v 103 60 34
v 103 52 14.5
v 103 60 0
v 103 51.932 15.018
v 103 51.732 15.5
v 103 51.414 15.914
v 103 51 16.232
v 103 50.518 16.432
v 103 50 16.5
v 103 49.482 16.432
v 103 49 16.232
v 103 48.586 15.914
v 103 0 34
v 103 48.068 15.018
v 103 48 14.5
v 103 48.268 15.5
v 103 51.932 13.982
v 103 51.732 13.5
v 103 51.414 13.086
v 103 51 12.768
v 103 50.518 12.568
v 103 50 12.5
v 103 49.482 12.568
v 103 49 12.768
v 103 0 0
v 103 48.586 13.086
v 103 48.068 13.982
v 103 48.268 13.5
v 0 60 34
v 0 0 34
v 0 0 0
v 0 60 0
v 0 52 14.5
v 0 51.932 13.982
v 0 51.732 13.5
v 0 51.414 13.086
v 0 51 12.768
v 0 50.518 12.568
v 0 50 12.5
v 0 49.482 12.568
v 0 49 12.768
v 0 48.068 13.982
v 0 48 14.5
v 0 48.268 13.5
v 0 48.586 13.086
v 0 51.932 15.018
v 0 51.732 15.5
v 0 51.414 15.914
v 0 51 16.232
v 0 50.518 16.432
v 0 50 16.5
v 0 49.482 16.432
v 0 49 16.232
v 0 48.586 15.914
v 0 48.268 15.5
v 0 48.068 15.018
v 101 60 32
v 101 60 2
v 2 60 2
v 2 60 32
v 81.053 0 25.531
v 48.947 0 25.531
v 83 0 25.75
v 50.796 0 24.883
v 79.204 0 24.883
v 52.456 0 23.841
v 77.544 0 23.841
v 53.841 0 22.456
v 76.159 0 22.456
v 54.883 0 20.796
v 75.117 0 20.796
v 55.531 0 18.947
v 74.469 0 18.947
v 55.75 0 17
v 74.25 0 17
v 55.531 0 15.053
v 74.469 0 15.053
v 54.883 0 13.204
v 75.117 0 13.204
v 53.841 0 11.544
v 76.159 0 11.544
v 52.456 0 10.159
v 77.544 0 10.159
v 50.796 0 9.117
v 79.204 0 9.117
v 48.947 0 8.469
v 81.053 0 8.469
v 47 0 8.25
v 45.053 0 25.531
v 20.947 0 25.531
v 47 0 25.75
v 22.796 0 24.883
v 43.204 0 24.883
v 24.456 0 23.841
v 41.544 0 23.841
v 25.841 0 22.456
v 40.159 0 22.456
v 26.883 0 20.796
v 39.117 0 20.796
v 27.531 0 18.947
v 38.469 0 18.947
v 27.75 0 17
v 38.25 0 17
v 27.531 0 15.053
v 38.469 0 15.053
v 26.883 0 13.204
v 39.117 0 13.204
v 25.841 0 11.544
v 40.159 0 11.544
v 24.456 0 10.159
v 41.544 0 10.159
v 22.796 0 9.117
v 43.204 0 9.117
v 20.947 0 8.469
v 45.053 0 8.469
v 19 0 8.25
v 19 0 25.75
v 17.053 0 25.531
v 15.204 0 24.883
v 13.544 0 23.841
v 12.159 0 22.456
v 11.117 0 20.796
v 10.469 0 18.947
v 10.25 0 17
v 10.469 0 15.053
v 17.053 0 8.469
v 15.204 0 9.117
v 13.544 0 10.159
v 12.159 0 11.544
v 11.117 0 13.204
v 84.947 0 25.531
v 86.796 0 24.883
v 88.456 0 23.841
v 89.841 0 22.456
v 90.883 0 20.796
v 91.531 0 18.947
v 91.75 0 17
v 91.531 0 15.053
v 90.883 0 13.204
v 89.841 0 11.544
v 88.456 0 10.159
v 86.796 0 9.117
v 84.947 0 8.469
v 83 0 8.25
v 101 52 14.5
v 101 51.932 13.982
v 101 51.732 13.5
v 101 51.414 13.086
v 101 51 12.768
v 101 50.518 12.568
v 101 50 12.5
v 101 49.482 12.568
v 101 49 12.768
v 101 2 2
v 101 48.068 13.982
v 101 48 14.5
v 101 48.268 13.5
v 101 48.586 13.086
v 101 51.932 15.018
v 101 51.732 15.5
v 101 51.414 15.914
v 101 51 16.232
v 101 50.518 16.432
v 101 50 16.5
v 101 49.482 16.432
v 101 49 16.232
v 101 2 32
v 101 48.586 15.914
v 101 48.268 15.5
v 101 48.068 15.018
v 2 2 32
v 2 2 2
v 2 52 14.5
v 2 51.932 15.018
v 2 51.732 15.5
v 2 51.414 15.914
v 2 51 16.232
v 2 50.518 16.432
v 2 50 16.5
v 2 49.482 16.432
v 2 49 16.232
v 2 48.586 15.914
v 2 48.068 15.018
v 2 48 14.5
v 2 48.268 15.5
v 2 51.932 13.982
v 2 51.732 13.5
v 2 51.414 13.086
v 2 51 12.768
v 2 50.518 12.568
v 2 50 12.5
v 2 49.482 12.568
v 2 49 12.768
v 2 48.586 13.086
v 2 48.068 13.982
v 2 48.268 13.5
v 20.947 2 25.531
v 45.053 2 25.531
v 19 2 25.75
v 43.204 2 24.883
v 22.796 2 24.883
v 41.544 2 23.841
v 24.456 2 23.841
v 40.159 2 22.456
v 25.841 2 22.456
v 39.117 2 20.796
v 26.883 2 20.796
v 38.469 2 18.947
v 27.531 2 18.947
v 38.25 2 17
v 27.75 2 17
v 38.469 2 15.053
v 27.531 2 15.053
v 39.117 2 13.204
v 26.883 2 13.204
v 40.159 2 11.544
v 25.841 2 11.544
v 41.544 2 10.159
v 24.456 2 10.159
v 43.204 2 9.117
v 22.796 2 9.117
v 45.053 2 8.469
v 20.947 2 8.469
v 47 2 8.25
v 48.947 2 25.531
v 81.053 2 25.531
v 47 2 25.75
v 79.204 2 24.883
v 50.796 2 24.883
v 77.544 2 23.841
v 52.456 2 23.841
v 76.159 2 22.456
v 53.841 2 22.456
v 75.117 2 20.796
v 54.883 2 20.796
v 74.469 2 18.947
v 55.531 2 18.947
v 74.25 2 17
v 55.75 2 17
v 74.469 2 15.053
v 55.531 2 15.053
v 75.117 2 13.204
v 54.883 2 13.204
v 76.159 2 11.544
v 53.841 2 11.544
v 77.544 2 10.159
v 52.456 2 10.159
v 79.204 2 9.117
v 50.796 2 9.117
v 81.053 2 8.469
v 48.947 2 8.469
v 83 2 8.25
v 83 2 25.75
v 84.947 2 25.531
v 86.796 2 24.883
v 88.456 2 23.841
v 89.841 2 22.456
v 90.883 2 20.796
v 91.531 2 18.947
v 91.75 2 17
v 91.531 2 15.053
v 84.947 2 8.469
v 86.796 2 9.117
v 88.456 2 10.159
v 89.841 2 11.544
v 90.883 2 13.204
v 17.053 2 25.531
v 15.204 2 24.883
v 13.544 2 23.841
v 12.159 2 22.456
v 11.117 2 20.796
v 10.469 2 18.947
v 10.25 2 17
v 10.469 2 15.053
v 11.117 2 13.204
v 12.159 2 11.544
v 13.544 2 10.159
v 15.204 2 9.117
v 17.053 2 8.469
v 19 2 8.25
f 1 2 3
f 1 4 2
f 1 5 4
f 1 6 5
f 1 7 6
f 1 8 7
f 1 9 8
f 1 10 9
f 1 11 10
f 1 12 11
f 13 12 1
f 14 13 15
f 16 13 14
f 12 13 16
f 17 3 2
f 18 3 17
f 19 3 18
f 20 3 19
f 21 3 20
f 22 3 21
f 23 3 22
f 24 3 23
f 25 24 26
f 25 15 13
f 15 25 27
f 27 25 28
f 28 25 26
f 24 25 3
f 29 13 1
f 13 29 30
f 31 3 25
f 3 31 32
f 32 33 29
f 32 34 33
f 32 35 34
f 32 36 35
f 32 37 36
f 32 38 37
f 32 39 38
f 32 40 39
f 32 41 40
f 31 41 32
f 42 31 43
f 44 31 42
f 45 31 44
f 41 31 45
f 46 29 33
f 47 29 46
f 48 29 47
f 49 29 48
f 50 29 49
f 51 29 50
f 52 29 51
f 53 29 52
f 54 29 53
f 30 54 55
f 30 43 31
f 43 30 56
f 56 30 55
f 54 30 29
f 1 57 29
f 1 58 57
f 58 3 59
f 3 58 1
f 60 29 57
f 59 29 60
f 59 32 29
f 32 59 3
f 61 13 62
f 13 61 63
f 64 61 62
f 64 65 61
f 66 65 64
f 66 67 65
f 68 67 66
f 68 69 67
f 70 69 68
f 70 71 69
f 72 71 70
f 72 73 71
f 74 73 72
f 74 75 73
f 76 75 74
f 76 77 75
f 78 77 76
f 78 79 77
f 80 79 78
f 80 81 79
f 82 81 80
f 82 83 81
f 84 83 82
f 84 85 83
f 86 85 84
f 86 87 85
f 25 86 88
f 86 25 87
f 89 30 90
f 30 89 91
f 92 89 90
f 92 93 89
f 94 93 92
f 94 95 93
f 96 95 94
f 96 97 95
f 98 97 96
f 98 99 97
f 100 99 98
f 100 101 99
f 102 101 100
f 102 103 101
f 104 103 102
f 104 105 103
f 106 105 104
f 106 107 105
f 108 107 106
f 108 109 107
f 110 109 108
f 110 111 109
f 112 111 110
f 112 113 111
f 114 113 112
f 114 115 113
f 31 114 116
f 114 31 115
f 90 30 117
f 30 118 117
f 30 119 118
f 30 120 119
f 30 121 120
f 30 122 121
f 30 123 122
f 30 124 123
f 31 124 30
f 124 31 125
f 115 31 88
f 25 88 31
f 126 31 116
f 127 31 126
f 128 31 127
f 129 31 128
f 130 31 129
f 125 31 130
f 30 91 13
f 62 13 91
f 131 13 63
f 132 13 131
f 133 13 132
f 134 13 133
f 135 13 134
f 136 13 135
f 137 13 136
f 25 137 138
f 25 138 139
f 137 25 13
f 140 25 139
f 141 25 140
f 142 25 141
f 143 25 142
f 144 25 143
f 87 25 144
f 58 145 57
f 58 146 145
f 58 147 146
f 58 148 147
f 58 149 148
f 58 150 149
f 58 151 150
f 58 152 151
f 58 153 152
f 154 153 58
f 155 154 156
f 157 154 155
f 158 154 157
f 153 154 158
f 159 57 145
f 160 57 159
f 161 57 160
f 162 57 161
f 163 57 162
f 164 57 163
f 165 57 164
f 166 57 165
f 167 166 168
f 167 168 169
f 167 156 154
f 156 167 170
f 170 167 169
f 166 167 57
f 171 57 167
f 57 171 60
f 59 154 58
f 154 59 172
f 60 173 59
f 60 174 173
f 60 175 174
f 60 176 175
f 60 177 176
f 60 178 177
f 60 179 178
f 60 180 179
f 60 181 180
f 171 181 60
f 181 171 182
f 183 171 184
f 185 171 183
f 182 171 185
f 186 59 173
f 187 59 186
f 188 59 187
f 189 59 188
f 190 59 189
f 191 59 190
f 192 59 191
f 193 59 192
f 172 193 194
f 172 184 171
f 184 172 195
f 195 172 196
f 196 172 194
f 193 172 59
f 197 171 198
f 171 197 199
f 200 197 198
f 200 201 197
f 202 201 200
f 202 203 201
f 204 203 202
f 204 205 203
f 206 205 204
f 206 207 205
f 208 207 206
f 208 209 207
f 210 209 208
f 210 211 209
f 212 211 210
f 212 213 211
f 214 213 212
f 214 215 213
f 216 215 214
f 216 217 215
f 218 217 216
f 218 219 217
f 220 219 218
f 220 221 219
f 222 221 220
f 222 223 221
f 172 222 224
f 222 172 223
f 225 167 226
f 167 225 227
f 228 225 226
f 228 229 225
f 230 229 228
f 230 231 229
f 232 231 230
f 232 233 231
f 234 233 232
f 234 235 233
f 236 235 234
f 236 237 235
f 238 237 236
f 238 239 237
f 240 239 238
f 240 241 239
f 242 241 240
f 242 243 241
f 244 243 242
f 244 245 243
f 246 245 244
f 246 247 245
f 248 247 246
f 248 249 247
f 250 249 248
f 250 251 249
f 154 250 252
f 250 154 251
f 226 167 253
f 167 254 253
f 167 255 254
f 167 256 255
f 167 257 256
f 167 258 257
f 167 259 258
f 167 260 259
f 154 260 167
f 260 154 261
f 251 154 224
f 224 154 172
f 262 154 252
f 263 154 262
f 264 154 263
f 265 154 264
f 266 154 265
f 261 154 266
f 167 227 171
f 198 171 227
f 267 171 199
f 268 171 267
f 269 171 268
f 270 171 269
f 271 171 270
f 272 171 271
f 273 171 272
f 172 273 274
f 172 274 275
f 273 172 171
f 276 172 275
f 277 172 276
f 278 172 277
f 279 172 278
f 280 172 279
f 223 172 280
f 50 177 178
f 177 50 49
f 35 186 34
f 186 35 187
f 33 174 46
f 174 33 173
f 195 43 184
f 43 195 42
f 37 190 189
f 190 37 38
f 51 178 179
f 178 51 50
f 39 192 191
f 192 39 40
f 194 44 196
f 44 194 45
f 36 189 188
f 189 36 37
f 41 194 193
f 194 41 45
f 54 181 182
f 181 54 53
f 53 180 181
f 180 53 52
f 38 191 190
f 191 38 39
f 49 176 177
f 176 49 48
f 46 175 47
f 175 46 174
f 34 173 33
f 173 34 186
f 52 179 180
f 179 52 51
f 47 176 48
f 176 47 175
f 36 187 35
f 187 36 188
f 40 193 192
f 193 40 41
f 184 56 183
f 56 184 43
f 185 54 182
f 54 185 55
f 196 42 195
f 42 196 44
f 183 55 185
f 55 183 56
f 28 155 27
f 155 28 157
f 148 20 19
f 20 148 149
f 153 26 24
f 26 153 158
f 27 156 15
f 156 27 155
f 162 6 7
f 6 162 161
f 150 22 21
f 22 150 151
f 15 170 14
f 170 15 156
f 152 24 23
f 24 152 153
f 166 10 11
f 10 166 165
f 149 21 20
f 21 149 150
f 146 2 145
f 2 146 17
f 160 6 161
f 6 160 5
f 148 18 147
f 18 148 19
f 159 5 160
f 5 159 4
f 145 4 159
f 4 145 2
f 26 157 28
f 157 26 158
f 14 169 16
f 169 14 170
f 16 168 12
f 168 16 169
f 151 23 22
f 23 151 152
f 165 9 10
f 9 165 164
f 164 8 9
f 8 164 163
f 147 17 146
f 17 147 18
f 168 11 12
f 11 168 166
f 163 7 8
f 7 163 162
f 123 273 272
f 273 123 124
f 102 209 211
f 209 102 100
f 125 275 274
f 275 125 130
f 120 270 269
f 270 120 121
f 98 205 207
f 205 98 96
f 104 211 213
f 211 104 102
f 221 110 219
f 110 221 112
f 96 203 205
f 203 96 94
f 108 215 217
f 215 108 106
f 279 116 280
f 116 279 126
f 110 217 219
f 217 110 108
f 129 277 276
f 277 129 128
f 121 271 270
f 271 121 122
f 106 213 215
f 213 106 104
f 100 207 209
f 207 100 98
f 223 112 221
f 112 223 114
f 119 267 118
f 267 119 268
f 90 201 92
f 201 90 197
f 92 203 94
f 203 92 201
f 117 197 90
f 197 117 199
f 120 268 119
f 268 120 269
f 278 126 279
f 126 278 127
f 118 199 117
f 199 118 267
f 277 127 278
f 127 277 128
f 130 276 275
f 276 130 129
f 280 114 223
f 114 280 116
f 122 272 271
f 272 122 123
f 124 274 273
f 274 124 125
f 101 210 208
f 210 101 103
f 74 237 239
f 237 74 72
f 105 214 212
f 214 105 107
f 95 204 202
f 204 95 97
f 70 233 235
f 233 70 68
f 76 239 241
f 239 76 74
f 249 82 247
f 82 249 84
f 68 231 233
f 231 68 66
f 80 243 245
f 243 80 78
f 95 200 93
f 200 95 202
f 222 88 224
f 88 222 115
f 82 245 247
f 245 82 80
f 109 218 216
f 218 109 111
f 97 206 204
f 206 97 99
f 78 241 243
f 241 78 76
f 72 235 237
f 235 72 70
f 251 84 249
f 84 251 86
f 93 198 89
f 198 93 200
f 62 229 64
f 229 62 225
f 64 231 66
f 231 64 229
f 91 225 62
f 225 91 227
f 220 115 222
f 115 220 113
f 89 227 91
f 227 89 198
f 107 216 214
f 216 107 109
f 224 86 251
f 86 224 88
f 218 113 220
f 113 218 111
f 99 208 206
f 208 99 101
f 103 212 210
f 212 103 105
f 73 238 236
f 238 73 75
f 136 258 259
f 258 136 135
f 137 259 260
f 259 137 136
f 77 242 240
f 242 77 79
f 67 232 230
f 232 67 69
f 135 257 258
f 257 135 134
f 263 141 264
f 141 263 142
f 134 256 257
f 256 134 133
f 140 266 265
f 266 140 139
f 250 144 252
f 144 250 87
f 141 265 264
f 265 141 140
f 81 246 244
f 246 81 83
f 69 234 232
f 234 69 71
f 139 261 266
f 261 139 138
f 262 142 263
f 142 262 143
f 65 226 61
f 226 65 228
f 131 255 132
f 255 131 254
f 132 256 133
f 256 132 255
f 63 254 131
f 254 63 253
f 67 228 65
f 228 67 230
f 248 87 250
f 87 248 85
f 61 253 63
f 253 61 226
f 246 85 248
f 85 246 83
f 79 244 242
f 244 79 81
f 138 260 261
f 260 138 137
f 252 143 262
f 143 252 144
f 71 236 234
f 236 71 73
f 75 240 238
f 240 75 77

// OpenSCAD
// For SP-150-24
//height = 50;
//space_front = 30;

// For RSP-150-27
height = 30;
space_front = 25;

width = 99;
shroud_depth = 35;

screw_depth = 25;
screw_height = 12.5;

cable_pos_right = width - 16;
cable_pos_center = width - 52;
cable_pos_left = width - 80;

screw_hole = 4;
cable_hole = 17.5;

wall = 2;

difference() {
    cube(size = [width + 2 * wall,
                 shroud_depth + space_front,
                 height + 2 * wall], 
         center = false);

    translate([wall, wall, wall])
    cube(size = [width, 
                 shroud_depth+space_front,
                 height], 
         center = false);
    
    translate([wall / 2,
           space_front + screw_depth,
           wall + screw_height])
    rotate([0, 90, 0])
    cylinder(h = 2*wall,
             r = screw_hole / 2,
             center = true,
             $fn = 24);

    translate([wall + width + wall / 2,
           space_front + screw_depth,
           wall + screw_height])
    rotate([0, 90, 0])
    cylinder(h = 2 * wall,
             r = screw_hole / 2,
             center = true,
             $fn = 24);

    translate([cable_pos_left,
               wall / 2,
               ( height + 2 * wall ) / 2])
    rotate([90,0,0])
    cylinder(h = 2 * wall, r = cable_hole / 2, center = true);

    translate([cable_pos_center,
               wall / 2,
               ( height + 2 * wall ) / 2])
    rotate([90,0,0])
    cylinder(h = 2 * wall, r = cable_hole / 2, center = true);

    translate([cable_pos_right,
               wall / 2,
               ( height + 2 * wall ) / 2])
    rotate([90,0,0])
    cylinder(h = 2 * wall, r = cable_hole / 2, center = true);
}
